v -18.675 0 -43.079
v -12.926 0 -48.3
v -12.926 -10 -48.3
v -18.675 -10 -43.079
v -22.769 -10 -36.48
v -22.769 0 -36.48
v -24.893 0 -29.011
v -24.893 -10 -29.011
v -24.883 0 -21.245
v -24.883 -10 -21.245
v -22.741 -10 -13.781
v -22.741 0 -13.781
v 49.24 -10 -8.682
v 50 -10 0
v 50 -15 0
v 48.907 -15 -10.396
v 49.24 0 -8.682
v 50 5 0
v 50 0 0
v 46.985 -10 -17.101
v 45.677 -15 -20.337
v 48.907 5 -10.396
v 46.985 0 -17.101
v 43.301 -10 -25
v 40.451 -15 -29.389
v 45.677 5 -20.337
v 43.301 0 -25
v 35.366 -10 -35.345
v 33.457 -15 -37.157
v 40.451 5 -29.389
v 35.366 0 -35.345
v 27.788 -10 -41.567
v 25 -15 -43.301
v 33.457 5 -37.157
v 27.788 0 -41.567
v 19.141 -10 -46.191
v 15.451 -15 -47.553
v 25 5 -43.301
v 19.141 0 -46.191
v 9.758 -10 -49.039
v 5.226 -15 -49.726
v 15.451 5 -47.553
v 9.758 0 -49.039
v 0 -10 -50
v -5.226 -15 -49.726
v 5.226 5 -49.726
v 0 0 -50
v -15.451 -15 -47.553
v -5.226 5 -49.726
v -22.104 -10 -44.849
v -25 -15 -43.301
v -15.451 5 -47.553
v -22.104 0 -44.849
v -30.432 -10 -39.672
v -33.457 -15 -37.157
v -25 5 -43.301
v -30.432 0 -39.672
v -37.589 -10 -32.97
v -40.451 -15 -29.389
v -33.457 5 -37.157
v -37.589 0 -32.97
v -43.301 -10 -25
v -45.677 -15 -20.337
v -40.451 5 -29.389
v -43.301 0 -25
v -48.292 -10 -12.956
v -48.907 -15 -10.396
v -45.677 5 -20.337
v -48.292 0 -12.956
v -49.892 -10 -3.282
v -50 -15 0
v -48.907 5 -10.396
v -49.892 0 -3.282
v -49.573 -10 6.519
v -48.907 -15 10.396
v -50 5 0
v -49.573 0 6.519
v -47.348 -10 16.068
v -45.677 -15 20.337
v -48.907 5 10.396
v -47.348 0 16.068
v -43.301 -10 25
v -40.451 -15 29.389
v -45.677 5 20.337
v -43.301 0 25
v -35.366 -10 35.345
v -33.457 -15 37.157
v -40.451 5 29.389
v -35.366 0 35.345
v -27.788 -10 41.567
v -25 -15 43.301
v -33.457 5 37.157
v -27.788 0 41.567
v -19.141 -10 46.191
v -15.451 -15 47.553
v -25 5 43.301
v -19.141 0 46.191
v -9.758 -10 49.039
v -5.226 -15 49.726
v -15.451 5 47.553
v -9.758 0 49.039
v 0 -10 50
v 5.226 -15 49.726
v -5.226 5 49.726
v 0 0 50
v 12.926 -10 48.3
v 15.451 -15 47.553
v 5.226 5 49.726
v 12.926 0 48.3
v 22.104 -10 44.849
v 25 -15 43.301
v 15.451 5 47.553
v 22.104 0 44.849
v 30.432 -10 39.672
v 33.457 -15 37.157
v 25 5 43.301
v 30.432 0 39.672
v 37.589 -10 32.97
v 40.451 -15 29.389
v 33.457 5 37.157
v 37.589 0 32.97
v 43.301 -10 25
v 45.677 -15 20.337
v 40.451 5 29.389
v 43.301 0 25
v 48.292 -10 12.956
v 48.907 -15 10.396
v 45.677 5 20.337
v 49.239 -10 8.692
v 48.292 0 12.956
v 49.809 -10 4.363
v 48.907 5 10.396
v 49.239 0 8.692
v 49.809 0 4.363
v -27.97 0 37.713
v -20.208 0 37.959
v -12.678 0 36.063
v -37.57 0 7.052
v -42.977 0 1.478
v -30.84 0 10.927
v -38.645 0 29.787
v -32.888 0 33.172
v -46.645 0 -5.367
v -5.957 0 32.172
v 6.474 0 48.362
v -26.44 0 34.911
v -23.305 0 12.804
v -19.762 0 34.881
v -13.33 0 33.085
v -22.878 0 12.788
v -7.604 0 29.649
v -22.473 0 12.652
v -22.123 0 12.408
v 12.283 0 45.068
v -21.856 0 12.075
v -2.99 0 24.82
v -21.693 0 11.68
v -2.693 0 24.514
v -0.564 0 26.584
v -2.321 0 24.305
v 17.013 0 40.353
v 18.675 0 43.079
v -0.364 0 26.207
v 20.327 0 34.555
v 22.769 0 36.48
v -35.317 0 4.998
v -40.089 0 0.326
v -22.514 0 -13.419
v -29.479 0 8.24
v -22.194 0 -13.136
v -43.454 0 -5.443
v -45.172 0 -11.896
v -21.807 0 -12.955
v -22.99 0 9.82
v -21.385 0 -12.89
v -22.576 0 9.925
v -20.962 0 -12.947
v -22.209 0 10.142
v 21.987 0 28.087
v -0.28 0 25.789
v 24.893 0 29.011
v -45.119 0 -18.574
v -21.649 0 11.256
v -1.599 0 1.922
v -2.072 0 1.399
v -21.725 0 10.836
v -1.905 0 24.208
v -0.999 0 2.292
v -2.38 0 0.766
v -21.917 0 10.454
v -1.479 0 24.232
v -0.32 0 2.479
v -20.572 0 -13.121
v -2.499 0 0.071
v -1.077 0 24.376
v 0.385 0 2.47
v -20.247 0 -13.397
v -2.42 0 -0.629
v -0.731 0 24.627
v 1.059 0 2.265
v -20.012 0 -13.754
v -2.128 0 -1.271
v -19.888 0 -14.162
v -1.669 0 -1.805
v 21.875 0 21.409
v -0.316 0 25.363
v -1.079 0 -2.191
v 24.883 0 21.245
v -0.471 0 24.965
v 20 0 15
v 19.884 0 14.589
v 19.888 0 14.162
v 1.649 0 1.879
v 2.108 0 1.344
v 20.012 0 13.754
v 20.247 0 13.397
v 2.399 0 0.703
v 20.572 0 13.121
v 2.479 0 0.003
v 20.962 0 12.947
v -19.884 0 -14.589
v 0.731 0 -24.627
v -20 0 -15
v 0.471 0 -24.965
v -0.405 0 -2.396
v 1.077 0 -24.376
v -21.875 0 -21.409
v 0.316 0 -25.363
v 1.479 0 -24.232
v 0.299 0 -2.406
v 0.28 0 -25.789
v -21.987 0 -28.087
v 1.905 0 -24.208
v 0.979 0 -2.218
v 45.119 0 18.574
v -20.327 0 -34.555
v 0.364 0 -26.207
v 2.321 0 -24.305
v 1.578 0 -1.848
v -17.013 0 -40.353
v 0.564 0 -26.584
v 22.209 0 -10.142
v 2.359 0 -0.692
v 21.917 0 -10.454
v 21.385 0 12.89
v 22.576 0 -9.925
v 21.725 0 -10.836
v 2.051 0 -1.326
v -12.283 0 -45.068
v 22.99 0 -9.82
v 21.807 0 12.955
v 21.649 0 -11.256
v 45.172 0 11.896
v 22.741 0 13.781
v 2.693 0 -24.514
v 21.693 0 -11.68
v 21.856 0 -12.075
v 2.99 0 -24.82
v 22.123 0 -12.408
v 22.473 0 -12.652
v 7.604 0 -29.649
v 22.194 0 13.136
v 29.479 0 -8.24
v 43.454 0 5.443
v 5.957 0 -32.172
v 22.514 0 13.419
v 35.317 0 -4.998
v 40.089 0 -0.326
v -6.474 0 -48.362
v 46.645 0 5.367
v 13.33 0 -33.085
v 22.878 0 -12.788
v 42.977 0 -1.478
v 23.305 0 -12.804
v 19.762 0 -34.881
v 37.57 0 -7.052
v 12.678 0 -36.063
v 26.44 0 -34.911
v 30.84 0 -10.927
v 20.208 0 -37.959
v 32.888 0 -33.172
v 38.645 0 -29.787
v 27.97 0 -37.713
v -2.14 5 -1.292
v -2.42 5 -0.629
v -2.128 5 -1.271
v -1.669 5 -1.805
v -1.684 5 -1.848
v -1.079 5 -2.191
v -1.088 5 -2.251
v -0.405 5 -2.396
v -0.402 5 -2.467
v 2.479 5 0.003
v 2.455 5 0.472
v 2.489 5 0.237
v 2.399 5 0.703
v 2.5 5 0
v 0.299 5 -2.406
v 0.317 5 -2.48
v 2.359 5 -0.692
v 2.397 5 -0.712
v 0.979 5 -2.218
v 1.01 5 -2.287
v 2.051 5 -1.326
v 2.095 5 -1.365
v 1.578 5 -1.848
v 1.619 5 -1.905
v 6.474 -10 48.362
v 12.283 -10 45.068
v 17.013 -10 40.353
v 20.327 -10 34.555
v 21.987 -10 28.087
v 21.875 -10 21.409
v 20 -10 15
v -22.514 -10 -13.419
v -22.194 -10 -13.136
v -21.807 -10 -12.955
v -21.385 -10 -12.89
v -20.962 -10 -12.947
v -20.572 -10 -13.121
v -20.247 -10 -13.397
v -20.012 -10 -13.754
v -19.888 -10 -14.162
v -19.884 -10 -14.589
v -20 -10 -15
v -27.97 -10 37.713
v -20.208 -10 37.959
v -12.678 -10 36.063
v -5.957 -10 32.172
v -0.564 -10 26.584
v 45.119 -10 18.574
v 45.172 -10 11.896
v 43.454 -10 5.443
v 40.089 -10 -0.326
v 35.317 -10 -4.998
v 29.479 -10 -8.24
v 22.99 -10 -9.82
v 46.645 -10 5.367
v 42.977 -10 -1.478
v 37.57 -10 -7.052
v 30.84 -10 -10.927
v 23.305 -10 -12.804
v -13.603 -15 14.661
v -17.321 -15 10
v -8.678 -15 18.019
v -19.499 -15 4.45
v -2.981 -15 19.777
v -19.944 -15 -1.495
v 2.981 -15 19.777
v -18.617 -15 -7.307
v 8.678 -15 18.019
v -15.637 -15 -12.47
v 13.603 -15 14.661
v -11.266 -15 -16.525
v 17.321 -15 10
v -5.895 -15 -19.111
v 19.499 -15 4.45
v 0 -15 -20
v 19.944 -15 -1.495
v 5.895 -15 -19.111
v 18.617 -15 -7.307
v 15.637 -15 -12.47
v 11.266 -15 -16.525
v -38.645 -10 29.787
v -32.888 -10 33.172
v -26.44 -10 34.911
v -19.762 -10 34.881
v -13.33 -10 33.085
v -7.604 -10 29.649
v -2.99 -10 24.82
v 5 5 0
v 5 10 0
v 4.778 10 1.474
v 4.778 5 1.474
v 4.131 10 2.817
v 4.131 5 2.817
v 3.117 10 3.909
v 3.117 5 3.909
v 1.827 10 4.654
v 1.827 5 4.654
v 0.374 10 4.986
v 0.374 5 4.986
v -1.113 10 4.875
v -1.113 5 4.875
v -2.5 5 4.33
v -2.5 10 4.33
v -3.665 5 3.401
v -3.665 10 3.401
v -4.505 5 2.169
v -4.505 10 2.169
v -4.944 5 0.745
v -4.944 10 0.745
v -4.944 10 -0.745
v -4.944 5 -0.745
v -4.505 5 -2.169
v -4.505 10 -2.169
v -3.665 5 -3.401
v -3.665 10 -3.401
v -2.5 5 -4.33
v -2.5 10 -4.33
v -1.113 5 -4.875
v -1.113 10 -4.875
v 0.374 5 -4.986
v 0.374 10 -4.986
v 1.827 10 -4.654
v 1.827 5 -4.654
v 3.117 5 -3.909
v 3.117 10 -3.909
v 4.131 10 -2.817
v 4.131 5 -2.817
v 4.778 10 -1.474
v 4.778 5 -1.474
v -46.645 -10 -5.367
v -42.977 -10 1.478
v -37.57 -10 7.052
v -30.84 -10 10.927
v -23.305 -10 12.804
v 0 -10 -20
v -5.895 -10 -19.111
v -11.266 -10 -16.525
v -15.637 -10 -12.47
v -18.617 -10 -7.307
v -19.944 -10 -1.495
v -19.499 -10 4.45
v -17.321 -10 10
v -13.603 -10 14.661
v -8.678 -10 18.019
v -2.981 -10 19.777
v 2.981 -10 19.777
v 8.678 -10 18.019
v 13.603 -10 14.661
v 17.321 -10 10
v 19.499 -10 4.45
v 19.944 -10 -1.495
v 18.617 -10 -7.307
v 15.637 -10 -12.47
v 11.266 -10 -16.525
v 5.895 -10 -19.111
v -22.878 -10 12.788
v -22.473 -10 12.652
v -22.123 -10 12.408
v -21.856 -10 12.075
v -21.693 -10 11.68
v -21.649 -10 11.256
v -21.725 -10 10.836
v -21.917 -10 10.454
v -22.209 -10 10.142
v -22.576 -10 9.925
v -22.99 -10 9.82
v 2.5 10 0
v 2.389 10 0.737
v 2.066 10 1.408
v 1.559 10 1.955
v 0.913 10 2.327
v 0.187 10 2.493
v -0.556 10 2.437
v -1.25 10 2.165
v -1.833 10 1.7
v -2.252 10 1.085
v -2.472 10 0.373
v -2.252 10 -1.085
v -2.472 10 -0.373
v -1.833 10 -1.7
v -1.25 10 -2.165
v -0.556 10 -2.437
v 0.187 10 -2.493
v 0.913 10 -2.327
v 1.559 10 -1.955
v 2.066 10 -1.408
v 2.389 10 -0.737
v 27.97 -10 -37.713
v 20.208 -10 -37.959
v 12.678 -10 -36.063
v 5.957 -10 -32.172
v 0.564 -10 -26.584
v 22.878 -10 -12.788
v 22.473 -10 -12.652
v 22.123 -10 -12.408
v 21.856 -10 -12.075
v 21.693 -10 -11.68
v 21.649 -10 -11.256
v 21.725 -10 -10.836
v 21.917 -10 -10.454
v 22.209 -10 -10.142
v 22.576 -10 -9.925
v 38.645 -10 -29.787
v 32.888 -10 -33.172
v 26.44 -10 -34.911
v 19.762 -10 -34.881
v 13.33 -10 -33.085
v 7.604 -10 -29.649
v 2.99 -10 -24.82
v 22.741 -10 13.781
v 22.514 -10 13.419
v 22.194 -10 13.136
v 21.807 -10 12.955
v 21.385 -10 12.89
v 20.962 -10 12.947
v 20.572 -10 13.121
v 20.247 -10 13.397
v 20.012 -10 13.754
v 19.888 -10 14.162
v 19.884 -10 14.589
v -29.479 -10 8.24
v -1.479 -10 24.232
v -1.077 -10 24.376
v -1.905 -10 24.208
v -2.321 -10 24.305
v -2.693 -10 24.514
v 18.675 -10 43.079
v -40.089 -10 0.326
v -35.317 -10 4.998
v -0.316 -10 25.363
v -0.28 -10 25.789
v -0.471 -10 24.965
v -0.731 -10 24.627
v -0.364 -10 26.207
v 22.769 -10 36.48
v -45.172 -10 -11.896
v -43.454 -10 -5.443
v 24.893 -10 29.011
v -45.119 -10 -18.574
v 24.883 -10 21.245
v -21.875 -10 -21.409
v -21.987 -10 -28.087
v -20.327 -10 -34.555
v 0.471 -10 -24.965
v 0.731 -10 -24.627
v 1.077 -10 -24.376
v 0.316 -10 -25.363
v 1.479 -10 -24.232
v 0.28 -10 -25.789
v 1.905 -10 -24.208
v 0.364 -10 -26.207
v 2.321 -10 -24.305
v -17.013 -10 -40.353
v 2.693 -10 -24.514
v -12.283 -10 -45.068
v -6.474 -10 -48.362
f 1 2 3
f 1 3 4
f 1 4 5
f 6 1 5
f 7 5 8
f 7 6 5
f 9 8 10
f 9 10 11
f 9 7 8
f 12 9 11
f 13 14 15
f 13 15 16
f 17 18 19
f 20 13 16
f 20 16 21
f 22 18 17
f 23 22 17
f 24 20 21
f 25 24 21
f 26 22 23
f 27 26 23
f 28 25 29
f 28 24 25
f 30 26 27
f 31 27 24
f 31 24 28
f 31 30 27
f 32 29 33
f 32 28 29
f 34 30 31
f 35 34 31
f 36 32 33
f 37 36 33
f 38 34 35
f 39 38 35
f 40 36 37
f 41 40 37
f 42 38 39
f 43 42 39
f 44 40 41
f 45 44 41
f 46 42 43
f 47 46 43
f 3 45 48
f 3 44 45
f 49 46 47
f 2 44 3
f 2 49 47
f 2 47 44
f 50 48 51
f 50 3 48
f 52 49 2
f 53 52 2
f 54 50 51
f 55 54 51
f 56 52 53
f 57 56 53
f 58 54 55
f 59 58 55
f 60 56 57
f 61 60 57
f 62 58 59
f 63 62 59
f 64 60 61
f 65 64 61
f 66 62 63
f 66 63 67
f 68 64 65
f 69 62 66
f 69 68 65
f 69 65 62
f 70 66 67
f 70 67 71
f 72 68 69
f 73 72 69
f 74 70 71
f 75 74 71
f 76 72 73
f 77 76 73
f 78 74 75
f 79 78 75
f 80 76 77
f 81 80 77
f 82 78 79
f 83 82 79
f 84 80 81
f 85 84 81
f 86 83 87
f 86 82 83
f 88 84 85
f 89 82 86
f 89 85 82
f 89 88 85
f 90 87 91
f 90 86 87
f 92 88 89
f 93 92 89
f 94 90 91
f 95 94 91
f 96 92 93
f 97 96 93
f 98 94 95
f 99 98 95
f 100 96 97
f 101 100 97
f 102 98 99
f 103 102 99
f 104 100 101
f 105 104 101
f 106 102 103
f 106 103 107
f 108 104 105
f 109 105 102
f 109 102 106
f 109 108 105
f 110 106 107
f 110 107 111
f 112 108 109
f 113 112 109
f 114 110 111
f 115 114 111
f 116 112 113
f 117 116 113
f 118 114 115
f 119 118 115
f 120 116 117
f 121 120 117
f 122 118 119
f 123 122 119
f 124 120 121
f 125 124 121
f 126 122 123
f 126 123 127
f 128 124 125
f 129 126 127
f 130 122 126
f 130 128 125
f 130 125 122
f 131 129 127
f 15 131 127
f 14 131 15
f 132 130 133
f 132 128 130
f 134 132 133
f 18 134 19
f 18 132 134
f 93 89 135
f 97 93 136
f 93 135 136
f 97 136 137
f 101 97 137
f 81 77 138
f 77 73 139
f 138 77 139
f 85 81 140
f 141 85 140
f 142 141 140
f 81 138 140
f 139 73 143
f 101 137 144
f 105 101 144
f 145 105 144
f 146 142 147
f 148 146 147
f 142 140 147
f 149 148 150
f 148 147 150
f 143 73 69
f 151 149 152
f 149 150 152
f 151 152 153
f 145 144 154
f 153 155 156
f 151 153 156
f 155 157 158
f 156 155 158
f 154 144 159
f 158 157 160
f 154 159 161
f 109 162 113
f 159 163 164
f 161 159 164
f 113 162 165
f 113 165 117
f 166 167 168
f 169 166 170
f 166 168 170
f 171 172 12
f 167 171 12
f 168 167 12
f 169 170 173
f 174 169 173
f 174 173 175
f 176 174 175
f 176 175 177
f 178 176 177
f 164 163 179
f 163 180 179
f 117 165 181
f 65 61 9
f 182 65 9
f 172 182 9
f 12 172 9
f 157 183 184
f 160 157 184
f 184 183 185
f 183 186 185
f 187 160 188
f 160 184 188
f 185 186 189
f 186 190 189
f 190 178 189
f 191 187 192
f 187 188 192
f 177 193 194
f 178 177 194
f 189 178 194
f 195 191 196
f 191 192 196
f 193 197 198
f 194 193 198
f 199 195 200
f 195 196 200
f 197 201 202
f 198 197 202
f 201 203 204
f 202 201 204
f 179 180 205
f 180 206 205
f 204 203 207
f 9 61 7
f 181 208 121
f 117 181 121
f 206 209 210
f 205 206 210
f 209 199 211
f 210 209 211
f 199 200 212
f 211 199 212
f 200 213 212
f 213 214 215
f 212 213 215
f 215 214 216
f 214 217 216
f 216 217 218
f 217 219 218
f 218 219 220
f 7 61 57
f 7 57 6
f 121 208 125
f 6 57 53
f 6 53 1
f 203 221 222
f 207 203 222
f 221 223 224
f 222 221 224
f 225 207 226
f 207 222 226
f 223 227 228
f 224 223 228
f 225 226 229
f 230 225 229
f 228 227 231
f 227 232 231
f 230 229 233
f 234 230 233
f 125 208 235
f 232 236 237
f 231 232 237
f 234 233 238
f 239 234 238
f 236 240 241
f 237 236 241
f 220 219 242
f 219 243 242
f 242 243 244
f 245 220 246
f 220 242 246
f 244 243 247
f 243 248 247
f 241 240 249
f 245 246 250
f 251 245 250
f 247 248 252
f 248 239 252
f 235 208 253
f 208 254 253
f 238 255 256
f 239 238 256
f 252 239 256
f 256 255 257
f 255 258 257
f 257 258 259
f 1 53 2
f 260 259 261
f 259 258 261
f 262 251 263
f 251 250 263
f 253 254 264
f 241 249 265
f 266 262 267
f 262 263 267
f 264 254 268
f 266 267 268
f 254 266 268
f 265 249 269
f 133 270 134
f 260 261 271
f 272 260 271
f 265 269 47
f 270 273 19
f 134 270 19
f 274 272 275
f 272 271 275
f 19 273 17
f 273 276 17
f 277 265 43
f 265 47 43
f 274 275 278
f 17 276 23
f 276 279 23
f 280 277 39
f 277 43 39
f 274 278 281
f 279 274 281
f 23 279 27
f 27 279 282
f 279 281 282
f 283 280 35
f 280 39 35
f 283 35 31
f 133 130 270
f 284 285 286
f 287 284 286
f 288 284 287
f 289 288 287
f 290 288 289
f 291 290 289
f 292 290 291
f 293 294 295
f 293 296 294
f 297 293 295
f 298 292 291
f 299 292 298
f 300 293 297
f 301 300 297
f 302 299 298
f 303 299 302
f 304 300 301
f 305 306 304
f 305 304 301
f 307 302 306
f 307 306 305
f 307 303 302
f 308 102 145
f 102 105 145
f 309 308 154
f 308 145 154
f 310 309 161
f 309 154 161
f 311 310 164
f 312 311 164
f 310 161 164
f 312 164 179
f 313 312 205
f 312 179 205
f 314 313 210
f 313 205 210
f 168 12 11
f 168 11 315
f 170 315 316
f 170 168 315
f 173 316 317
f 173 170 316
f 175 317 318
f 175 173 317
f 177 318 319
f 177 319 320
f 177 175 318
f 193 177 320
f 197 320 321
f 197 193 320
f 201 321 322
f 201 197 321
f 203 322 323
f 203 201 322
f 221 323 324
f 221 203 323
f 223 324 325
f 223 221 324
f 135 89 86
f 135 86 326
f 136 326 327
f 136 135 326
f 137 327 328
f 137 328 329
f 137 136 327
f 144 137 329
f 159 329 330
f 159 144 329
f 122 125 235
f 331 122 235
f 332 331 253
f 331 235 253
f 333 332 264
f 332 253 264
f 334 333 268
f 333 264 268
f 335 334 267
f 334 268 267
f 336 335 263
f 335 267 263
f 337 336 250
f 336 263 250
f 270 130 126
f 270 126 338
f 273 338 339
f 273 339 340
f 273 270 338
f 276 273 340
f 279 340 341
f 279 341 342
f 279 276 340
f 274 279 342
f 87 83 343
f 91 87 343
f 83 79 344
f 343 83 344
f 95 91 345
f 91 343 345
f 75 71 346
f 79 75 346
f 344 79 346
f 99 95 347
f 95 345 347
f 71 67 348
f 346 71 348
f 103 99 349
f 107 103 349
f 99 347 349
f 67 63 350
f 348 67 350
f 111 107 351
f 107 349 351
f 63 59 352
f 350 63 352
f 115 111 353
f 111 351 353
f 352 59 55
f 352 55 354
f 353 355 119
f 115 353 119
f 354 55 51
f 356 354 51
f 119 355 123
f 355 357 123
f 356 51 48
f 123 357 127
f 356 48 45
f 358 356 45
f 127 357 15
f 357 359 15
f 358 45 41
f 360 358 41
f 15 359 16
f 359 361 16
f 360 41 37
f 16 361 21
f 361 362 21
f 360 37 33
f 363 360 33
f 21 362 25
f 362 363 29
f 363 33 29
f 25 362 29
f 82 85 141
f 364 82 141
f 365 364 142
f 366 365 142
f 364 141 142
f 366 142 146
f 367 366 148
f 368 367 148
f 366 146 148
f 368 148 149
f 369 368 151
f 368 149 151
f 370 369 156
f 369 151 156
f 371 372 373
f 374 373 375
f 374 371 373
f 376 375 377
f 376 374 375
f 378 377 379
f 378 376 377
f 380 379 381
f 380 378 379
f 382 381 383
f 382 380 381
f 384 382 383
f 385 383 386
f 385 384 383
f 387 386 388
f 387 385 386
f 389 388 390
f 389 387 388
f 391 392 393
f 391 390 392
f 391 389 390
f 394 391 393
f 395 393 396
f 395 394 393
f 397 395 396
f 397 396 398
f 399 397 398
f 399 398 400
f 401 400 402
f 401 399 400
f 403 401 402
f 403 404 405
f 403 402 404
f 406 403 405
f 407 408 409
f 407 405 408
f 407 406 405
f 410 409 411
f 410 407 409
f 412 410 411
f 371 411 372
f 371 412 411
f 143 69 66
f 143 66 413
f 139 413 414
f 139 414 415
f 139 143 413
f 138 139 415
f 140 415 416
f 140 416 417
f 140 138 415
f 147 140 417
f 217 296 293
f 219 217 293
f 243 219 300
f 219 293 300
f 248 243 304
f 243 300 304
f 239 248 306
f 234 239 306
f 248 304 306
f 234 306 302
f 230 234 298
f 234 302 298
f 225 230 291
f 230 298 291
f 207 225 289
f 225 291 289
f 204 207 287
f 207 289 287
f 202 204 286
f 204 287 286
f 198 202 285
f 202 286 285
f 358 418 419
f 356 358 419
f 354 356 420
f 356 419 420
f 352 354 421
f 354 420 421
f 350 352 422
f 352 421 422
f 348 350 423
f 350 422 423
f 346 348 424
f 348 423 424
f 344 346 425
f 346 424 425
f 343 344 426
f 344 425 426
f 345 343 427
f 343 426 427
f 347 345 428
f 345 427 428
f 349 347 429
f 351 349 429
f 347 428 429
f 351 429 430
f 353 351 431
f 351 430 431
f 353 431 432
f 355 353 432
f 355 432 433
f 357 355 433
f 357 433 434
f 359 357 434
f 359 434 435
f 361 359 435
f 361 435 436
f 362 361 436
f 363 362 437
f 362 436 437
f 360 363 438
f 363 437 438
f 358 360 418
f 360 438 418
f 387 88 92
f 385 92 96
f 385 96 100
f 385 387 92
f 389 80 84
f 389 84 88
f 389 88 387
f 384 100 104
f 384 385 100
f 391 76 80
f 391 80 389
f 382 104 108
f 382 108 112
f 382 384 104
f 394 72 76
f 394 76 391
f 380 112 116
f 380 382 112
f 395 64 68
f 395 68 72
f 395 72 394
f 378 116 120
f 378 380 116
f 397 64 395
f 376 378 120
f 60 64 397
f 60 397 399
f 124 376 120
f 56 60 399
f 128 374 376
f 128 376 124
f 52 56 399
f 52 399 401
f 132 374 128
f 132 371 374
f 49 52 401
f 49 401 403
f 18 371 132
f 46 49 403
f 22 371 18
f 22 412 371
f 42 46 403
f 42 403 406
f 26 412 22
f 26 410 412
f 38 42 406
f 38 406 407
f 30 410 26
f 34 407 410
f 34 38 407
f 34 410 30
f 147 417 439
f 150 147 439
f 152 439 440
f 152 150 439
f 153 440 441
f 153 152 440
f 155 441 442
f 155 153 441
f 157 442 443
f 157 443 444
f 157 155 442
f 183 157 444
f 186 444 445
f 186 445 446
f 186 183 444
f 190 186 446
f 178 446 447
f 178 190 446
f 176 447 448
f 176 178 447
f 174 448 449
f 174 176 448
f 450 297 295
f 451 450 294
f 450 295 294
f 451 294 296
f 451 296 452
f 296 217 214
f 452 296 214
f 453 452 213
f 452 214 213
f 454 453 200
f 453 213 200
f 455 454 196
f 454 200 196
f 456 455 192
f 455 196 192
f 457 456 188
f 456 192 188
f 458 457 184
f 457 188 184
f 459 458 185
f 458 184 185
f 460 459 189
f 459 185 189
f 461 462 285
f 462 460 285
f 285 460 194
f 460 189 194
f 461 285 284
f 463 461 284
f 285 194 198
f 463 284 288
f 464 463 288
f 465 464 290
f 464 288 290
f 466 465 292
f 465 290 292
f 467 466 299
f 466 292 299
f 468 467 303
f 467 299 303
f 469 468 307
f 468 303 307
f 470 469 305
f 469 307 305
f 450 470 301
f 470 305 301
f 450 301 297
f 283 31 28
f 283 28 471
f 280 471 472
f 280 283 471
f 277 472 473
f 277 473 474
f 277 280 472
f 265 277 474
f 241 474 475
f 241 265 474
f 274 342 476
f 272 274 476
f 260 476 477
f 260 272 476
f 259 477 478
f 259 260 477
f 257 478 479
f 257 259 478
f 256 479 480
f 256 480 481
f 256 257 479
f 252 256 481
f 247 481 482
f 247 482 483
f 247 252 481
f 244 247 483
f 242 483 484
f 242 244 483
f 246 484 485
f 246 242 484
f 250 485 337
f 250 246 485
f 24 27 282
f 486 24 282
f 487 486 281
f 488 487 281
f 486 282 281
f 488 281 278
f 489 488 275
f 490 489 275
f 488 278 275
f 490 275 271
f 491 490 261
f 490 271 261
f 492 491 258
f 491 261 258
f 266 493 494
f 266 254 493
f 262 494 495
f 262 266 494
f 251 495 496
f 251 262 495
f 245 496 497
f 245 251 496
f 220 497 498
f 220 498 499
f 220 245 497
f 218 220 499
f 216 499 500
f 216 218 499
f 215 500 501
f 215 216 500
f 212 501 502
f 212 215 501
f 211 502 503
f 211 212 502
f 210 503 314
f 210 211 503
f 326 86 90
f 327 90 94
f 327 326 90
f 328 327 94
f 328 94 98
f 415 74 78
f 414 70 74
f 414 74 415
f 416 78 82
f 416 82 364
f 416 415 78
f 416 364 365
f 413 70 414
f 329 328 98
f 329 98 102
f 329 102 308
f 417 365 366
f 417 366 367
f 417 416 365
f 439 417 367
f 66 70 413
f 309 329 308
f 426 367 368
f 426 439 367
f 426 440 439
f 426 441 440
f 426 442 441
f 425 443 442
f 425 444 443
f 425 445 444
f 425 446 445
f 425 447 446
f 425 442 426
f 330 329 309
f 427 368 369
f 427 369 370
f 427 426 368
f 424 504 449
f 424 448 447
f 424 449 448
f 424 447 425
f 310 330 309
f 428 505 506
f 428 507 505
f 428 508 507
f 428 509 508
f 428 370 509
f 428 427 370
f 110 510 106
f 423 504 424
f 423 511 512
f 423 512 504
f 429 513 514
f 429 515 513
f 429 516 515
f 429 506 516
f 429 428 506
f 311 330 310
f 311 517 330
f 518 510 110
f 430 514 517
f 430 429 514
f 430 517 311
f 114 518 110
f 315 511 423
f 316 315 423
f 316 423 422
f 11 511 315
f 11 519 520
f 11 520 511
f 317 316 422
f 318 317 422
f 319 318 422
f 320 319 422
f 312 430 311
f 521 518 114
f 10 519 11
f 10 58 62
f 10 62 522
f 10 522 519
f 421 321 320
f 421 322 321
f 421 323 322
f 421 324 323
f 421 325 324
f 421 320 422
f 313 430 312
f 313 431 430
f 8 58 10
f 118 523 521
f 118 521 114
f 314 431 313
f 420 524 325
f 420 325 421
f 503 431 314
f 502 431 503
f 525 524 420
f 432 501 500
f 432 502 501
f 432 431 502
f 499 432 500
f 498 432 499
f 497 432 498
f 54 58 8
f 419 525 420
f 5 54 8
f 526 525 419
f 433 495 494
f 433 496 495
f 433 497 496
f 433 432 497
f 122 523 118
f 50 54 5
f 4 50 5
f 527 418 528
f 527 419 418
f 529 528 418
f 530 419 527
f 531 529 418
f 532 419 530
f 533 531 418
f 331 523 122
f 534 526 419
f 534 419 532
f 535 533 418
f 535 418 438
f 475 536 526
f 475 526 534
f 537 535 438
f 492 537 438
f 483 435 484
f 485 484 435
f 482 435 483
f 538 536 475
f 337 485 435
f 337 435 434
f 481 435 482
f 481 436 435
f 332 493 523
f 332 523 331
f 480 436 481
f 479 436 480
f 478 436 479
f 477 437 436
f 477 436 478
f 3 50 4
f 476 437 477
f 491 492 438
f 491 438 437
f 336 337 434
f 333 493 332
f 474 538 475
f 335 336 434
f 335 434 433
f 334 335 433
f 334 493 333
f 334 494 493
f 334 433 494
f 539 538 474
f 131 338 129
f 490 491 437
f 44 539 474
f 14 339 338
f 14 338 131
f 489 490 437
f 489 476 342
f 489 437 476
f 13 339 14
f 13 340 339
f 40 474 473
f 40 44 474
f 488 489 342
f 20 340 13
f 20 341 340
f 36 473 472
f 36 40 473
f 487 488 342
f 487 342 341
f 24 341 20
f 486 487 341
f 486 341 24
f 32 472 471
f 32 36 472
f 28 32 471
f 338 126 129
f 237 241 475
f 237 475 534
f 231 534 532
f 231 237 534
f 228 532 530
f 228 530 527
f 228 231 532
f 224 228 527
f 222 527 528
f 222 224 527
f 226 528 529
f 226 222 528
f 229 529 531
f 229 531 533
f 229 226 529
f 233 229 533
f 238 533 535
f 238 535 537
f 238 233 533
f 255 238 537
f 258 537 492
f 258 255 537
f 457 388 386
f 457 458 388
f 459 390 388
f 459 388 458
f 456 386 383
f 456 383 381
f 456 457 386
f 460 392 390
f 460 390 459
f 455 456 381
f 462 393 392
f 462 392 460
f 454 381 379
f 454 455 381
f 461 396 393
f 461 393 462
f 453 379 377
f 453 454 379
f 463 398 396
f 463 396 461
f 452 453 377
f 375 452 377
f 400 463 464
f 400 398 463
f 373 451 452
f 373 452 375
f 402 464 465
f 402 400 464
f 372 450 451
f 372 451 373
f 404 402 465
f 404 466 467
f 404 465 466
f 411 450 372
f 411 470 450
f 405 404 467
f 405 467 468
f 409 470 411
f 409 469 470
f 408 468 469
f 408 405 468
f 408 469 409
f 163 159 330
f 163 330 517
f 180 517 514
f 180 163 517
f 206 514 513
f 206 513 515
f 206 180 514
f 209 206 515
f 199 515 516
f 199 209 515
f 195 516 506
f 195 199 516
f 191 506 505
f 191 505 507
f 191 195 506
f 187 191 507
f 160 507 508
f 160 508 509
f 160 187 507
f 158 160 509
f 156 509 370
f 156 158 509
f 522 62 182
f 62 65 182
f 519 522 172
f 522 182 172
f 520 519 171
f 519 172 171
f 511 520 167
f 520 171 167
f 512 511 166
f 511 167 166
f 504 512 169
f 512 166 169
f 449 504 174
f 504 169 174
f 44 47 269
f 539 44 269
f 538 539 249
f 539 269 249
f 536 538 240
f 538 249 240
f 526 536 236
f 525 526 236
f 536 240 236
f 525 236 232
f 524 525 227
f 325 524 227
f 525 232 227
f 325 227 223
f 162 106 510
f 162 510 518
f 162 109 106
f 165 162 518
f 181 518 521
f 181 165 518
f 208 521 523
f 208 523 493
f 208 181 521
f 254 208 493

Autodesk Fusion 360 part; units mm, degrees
sketch "Sketch1" plane through (0, 0, 0) normal (0, 1, 0) x (1, 0, 0)
  circle A0 centre (0, 0) radius 50
  circle A1 centre (0, 0) radius 25 construction
  arc A2 (0, -50) -> (20, -15) centre (-2.8415, -25.162) ccw
  arc A3 (12.9263, -48.3002) -> (22.741, -13.7806) centre (-2.8415, -25.162) ccw
  arc A4 (22.741, -13.7806) -> (20, -15) centre (21.3705, -14.3903) ccw
  line L0 (0, -1.75) -> (0, -22.5)
  arc A5 (23.3048, 12.804) -> (22.9904, 9.8205) centre (23.1476, 11.3122) ccw
  arc A6 (43.3013, -25) -> (22.9904, 9.8205) centre (20.3702, -15.0418) ccw
  arc A7 (48.2924, -12.9556) -> (23.3048, 12.804) centre (20.3702, -15.0418) ccw
  arc A8 (0.5638, 26.5845) -> (2.9904, 24.8205) centre (1.7771, 25.7025) ccw
  arc A9 (43.3013, 25) -> (2.9904, 24.8205) centre (23.2117, 10.1202) ccw
  arc A10 (35.3661, 35.3446) -> (0.5638, 26.5845) centre (23.2117, 10.1202) ccw
  arc A11 (-22.741, 13.7806) -> (-20, 15) centre (-21.3705, 14.3903) ccw
  arc A12 (0, 50) -> (-20, 15) centre (2.8415, 25.162) ccw
  arc A13 (-12.9263, 48.3002) -> (-22.741, 13.7806) centre (2.8415, 25.162) ccw
  arc A14 (-23.3048, -12.804) -> (-22.9904, -9.8205) centre (-23.1476, -11.3122) ccw
  arc A15 (-43.3013, 25) -> (-22.9904, -9.8205) centre (-20.3702, 15.0418) ccw
  arc A16 (-48.2924, 12.9556) -> (-23.3048, -12.804) centre (-20.3702, 15.0418) ccw
  arc A17 (-0.5638, -26.5845) -> (-2.9904, -24.8205) centre (-1.7771, -25.7025) ccw
  arc A18 (-43.3013, -25) -> (-2.9904, -24.8205) centre (-23.2117, -10.1202) ccw
  arc A19 (-35.3661, -35.3446) -> (-0.5638, -26.5845) centre (-23.2117, -10.1202) ccw
  dimension "d1" = 100
  dimension "d2" = 50
  dimension "d6" = 1.5
  dimension "d7" = 25
  dimension "d9" = 360
extrude "Extrude1" add sketch "Sketch1" against normal blind 10 contours A0 A8 A9 A10 | A0 A5 A6 A7 | A0 A11 A12 A13 | A0 A2 A3 A4 | A0 A14 A15 A16 | A0 A17 A18 A19 makes body 1 at (4.4955, -6.6667, -26.6944) makes body 2 at (-20.1028, -6.6667, 34.9262) makes body 3 at (-20.1955, -6.6667, -34.8726) makes body 4 at (43.3198, -6.6667, 5.1264) makes body 5 at (20.4621, -6.6667, 16.1098) makes body 6 at (-25.3658, -6.6667, 9.454)
sketch "Sketch2" plane through (0, 0, 0) normal (0, 1, 0) x (1, 0, 0)
  circle A0 centre (0, 0) radius 50
extrude "Extrude2" add sketch "Sketch2" along normal blind 5 bodies 1 2 3 4 5 6
ref_plane "WorkPlane1" through (0, -10, 0) normal (0, 1, 0) x (0, 0, 1)
sketch "Sketch3" plane through (0, -10, 0) normal (0, 1, 0) x (1, 0, 0)
  circle A0 centre (0, 0) radius 50
  dimension "d15" = 100
extrude "Extrude3" add sketch "Sketch3" against normal blind 5 separate body makes body 7
combine "Combine1" operation add target body 7 tool bodies 1
hole "Hole1" at (0, -15, 0) direction (0, 1, 0) diameter 40 depth 15 tip angle 180 bodies 7
sketch "Sketch4" plane through (0, 0, 0) normal (0, 1, 0) x (1, 0, 0)
  circle A0 centre (0, 0) radius 5
  circle A1 centre (0, 0) radius 2.5
  dimension "d21" = 10
  dimension "d22" = 5
hole "Hole2" at (-0.0204, 0, 0.0738) direction (0, 1, 0) diameter 5 depth 50 tip angle 180 bodies 7
extrude "Extrude5" add sketch "Sketch4" along normal blind 10 bodies 7
